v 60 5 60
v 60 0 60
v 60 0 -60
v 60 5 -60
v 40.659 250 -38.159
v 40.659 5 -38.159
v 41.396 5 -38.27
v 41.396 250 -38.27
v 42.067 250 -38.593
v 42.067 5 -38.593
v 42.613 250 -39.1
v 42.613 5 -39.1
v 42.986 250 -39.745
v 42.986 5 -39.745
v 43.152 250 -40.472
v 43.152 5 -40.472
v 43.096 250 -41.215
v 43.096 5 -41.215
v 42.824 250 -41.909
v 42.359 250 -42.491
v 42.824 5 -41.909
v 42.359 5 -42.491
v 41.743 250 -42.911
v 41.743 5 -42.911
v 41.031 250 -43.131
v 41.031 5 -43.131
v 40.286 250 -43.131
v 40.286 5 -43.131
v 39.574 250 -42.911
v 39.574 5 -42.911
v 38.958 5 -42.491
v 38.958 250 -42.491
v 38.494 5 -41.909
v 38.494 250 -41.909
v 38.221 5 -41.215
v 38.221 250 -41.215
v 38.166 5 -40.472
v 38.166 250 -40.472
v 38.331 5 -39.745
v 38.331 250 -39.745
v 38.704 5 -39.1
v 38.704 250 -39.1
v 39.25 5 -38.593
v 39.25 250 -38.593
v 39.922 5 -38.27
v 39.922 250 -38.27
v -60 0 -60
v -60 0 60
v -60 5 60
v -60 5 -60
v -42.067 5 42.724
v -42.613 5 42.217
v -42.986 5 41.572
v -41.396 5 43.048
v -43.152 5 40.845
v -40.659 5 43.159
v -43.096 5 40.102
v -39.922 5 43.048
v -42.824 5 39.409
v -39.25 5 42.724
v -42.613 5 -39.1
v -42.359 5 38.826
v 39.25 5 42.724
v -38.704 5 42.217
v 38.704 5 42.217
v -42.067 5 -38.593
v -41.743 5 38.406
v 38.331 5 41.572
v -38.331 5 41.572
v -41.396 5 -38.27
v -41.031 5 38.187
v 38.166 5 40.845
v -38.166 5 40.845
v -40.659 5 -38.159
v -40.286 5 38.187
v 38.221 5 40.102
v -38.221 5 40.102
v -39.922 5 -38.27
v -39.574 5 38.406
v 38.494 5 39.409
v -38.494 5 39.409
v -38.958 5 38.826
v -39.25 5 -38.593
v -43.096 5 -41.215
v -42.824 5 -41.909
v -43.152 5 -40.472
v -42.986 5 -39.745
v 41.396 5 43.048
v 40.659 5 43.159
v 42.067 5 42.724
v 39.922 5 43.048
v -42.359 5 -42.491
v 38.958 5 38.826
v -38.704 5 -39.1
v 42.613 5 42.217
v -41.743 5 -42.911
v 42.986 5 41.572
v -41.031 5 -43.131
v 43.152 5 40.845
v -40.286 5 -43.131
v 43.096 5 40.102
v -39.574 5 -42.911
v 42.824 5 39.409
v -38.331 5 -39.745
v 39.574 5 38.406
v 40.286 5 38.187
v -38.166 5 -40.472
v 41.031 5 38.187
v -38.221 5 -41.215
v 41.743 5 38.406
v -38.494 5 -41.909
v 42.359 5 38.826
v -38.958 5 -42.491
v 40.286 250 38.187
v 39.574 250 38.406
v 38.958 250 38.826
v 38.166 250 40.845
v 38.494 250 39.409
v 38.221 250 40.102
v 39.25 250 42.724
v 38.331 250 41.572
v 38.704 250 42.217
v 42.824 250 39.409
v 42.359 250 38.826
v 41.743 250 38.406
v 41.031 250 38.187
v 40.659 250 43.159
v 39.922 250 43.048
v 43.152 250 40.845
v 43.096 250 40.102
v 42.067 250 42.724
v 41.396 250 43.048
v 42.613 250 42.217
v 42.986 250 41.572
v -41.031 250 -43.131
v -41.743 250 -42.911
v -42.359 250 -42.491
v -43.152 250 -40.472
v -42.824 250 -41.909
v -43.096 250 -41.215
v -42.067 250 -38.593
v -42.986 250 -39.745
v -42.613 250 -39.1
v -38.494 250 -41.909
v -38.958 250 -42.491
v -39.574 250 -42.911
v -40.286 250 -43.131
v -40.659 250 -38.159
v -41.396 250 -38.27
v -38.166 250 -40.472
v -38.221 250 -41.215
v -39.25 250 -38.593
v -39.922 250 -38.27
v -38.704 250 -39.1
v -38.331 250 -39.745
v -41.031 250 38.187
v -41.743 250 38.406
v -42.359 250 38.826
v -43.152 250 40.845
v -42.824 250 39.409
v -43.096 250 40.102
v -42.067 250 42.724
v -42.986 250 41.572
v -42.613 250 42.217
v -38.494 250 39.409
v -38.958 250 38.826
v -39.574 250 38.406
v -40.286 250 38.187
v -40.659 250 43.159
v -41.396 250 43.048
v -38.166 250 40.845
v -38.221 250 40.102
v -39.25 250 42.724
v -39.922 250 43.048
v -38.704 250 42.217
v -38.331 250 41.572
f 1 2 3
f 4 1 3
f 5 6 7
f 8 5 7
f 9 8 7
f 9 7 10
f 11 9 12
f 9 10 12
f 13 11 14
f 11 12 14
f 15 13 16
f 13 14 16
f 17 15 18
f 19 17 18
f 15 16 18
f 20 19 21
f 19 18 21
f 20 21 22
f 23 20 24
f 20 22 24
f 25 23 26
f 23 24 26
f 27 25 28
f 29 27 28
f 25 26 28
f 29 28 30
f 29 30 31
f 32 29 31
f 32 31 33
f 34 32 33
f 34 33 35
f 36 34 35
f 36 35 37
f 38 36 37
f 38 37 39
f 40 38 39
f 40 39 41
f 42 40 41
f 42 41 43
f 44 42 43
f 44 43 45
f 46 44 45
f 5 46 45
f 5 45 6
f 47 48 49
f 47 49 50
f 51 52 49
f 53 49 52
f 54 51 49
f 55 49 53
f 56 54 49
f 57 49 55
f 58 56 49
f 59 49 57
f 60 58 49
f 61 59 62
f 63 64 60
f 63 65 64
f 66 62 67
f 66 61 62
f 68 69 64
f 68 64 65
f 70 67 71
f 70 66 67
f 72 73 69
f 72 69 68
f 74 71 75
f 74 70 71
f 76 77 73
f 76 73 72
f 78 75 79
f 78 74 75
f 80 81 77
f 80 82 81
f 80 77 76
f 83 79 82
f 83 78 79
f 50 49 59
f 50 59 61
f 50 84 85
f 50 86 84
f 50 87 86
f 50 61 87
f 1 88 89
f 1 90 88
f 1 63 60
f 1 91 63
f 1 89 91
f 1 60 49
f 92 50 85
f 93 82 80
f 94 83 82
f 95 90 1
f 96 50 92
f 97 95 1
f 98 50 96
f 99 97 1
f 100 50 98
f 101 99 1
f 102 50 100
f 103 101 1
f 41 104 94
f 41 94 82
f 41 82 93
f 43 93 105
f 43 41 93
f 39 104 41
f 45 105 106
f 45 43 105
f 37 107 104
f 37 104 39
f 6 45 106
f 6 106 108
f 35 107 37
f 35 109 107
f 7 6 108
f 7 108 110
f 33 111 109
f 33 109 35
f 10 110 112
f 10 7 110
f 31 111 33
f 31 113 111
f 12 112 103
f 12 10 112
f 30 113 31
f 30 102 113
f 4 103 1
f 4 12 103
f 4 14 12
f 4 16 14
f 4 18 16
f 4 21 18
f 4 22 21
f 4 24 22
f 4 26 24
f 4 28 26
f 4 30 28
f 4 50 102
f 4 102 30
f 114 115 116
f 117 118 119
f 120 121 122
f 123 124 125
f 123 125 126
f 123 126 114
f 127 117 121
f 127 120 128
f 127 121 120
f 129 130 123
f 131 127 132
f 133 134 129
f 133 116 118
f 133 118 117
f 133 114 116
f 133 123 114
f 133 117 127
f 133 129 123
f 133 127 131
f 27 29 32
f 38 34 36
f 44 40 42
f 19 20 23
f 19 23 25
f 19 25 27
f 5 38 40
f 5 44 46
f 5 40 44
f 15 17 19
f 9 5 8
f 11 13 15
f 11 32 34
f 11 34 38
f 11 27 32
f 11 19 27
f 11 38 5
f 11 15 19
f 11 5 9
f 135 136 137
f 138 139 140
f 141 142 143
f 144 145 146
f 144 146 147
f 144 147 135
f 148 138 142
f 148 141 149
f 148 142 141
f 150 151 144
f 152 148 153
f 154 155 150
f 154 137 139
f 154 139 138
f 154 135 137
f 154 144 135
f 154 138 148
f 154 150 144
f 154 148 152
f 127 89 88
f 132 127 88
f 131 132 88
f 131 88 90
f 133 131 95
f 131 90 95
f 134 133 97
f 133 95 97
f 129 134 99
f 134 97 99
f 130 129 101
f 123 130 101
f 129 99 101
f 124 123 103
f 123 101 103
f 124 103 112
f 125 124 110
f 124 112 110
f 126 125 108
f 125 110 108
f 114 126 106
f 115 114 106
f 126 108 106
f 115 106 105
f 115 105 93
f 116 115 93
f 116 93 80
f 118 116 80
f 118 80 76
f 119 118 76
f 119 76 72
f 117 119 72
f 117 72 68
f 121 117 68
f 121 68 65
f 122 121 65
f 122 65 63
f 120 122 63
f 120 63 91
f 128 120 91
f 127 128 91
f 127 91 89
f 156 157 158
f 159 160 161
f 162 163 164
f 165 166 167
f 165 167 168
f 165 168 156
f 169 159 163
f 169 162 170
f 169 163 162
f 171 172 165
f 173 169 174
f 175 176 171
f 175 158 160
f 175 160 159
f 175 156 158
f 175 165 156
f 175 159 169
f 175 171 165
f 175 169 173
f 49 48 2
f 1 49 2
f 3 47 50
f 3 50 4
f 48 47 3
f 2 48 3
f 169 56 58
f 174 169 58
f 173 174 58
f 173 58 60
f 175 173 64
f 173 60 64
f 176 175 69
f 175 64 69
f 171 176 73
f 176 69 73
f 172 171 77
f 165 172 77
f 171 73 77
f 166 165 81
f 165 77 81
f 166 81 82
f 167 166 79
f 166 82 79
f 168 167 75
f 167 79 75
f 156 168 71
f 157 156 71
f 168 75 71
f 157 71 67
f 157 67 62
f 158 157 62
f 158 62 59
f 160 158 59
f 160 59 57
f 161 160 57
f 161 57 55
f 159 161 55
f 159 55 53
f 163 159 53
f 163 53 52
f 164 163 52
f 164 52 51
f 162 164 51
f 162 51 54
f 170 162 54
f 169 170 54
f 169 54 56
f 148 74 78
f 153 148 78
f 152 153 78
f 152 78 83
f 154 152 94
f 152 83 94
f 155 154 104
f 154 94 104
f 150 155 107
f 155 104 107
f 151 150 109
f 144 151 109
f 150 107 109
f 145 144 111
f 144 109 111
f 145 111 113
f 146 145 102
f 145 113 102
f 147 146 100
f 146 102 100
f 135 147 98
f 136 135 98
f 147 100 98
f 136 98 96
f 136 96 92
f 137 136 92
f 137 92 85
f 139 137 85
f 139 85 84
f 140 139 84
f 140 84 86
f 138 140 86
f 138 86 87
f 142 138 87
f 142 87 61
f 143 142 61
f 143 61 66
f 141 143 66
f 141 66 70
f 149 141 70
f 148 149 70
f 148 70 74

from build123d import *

# Parameters (mm, degrees)
SKETCH1_W           = 120
SKETCH1_H           = 120
SKETCH1_R           = 2.5
BOSS_EXTRUDE1_DEPTH = 5
SKETCH1_3_R         = 2.5
BOSS_EXTRUDE2_DEPTH = 250


with BuildPart() as part:
    # Sketch1 → Boss-Extrude1 (new body)
    with BuildSketch(Plane(origin=(0, 0, 0), x_dir=(1, 0, 0), z_dir=(0, 1, 0))):
        Rectangle(SKETCH1_W, SKETCH1_H)
        with Locations((-40.658639918, -40.658639918)):
            Circle(SKETCH1_R, mode=Mode.SUBTRACT)
        with Locations((40.658639918, -40.658639918)):
            Circle(SKETCH1_R, mode=Mode.SUBTRACT)
        with Locations((-40.658639918, 40.658639918)):
            Circle(SKETCH1_R, mode=Mode.SUBTRACT)
        with Locations((40.658639918, 40.658639918)):
            Circle(SKETCH1_R, mode=Mode.SUBTRACT)
    extrude(amount=BOSS_EXTRUDE1_DEPTH)

    # Sketch1<3> → Boss-Extrude2 (add)
    with BuildSketch(Plane(origin=(0, 0, 0), x_dir=(1, 0, 0), z_dir=(0, 1, 0))):
        with Locations((-40.658639918, 40.658639918)):
            Circle(SKETCH1_3_R)
        with Locations((40.658639918, -40.658639918)):
            Circle(SKETCH1_3_R)
        with Locations((40.658639918, 40.658639918)):
            Circle(SKETCH1_3_R)
        with Locations((-40.658639918, -40.658639918)):
            Circle(SKETCH1_3_R)
    extrude(amount=BOSS_EXTRUDE2_DEPTH)


solid = part.part
